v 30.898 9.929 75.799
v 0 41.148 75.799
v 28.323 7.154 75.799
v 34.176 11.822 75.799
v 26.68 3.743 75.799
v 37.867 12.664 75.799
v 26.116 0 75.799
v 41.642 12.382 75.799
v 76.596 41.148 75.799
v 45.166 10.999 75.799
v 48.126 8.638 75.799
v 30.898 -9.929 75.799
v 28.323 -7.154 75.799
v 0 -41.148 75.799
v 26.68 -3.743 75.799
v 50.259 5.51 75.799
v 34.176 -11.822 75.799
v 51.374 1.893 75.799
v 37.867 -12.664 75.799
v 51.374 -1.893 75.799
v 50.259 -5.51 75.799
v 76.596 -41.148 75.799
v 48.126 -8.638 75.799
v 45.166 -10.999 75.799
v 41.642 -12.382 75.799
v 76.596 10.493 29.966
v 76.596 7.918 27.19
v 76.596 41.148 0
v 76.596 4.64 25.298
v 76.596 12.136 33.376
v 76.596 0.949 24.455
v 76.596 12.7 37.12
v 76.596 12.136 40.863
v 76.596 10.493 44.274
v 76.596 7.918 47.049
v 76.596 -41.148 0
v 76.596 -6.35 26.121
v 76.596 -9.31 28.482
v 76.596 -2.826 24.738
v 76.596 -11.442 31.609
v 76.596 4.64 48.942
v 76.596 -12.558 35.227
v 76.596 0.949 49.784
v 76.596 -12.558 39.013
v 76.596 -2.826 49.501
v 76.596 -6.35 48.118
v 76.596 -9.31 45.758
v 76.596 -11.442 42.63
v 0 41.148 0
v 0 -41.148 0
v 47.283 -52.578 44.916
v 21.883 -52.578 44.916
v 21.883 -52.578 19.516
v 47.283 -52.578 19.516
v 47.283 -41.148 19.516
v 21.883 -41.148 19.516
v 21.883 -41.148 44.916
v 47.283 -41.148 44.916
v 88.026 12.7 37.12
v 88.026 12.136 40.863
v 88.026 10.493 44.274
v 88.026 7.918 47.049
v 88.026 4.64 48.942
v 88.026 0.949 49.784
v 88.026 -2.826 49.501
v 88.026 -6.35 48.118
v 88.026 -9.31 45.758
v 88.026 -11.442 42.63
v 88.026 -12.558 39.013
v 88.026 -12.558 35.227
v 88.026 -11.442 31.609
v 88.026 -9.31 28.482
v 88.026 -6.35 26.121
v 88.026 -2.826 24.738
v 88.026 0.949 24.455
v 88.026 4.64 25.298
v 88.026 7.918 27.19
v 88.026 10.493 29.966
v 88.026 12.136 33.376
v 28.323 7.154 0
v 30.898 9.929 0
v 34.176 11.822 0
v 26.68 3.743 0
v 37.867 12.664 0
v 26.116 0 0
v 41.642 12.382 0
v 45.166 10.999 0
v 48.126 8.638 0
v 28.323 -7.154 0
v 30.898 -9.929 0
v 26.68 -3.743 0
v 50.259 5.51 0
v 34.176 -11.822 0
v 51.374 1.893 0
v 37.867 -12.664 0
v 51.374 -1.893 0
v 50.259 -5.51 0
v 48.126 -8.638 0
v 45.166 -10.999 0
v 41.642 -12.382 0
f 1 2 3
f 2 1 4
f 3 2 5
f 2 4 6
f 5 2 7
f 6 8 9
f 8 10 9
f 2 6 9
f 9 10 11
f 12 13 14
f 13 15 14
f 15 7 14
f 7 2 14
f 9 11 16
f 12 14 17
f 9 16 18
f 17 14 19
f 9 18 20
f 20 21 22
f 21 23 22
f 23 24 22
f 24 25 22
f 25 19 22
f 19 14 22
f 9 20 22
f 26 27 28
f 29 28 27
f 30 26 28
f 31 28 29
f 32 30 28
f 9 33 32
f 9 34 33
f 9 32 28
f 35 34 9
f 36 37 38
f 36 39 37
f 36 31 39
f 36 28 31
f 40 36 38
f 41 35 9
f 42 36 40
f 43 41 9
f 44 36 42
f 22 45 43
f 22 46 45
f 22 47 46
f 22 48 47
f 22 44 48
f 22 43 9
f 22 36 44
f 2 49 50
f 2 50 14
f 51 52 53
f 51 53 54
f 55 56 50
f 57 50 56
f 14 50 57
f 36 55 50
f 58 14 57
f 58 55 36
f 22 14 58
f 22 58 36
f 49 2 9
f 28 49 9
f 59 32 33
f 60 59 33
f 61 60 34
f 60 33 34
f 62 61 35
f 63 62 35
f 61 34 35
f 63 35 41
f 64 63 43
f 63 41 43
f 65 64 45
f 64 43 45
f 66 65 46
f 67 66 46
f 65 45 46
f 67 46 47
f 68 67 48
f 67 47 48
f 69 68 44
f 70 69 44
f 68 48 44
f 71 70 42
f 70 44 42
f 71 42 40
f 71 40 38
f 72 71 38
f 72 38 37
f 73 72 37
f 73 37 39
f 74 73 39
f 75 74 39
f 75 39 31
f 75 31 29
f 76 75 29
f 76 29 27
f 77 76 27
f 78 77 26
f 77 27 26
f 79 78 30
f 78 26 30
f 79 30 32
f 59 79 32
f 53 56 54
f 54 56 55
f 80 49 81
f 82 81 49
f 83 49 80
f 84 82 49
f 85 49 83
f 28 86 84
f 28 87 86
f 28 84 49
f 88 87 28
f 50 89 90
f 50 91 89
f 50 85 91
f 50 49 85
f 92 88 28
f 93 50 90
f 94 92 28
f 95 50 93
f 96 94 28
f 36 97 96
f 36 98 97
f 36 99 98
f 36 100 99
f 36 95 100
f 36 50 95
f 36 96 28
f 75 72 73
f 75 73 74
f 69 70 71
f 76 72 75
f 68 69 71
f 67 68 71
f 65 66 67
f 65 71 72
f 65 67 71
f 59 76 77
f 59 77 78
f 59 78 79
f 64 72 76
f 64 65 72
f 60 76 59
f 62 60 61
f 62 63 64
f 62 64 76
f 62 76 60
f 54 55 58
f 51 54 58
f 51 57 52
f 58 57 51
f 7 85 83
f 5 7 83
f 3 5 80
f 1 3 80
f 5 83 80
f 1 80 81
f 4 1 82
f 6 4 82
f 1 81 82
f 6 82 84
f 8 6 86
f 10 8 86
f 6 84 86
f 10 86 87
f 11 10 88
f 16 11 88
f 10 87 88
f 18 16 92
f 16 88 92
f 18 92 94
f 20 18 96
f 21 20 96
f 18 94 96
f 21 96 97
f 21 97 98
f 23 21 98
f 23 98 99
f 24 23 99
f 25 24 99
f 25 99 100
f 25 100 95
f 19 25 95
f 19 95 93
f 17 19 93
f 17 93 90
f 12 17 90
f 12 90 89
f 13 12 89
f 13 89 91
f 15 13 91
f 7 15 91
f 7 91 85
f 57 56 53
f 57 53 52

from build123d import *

# Parameters (mm, degrees)
F0_W     = 76.5958726406
F0_H     = 75.7986828685
F1_DEPTH = 41.148
F3_D     = 25.4
F4_W     = 25.4
F4_H     = 25.4
F5_DEPTH = 11.43
F6_R     = 12.7
F7_DEPTH = 11.43


with BuildPart() as f1:
    # F0 (on Front) → F1 (new body, symmetric)
    with BuildSketch(Plane.XZ):
        with Locations((38.2979363203, 37.8993414342)):
            Rectangle(F0_W, F0_H)
    extrude(amount=F1_DEPTH, both=True)

    # F3 (through all)
    with Locations(Plane.XY.offset(75.7986828685)):
        with Locations((38.8162694871, 0)):
            Hole(F3_D / 2)

    # F4 (on face) → F5 (join)
    with BuildSketch(Plane.XZ.offset(41.148)):
        with Locations((34.5825459808, 32.216026066)):
            Rectangle(F4_W, F4_H)
    extrude(amount=F5_DEPTH)

    # F6 (on face) → F7 (join)
    with BuildSketch(Plane.YZ.offset(76.5958726406)):
        with Locations((0, 37.119705635)):
            Circle(F6_R)
    extrude(amount=F7_DEPTH)


solid = f1.part
